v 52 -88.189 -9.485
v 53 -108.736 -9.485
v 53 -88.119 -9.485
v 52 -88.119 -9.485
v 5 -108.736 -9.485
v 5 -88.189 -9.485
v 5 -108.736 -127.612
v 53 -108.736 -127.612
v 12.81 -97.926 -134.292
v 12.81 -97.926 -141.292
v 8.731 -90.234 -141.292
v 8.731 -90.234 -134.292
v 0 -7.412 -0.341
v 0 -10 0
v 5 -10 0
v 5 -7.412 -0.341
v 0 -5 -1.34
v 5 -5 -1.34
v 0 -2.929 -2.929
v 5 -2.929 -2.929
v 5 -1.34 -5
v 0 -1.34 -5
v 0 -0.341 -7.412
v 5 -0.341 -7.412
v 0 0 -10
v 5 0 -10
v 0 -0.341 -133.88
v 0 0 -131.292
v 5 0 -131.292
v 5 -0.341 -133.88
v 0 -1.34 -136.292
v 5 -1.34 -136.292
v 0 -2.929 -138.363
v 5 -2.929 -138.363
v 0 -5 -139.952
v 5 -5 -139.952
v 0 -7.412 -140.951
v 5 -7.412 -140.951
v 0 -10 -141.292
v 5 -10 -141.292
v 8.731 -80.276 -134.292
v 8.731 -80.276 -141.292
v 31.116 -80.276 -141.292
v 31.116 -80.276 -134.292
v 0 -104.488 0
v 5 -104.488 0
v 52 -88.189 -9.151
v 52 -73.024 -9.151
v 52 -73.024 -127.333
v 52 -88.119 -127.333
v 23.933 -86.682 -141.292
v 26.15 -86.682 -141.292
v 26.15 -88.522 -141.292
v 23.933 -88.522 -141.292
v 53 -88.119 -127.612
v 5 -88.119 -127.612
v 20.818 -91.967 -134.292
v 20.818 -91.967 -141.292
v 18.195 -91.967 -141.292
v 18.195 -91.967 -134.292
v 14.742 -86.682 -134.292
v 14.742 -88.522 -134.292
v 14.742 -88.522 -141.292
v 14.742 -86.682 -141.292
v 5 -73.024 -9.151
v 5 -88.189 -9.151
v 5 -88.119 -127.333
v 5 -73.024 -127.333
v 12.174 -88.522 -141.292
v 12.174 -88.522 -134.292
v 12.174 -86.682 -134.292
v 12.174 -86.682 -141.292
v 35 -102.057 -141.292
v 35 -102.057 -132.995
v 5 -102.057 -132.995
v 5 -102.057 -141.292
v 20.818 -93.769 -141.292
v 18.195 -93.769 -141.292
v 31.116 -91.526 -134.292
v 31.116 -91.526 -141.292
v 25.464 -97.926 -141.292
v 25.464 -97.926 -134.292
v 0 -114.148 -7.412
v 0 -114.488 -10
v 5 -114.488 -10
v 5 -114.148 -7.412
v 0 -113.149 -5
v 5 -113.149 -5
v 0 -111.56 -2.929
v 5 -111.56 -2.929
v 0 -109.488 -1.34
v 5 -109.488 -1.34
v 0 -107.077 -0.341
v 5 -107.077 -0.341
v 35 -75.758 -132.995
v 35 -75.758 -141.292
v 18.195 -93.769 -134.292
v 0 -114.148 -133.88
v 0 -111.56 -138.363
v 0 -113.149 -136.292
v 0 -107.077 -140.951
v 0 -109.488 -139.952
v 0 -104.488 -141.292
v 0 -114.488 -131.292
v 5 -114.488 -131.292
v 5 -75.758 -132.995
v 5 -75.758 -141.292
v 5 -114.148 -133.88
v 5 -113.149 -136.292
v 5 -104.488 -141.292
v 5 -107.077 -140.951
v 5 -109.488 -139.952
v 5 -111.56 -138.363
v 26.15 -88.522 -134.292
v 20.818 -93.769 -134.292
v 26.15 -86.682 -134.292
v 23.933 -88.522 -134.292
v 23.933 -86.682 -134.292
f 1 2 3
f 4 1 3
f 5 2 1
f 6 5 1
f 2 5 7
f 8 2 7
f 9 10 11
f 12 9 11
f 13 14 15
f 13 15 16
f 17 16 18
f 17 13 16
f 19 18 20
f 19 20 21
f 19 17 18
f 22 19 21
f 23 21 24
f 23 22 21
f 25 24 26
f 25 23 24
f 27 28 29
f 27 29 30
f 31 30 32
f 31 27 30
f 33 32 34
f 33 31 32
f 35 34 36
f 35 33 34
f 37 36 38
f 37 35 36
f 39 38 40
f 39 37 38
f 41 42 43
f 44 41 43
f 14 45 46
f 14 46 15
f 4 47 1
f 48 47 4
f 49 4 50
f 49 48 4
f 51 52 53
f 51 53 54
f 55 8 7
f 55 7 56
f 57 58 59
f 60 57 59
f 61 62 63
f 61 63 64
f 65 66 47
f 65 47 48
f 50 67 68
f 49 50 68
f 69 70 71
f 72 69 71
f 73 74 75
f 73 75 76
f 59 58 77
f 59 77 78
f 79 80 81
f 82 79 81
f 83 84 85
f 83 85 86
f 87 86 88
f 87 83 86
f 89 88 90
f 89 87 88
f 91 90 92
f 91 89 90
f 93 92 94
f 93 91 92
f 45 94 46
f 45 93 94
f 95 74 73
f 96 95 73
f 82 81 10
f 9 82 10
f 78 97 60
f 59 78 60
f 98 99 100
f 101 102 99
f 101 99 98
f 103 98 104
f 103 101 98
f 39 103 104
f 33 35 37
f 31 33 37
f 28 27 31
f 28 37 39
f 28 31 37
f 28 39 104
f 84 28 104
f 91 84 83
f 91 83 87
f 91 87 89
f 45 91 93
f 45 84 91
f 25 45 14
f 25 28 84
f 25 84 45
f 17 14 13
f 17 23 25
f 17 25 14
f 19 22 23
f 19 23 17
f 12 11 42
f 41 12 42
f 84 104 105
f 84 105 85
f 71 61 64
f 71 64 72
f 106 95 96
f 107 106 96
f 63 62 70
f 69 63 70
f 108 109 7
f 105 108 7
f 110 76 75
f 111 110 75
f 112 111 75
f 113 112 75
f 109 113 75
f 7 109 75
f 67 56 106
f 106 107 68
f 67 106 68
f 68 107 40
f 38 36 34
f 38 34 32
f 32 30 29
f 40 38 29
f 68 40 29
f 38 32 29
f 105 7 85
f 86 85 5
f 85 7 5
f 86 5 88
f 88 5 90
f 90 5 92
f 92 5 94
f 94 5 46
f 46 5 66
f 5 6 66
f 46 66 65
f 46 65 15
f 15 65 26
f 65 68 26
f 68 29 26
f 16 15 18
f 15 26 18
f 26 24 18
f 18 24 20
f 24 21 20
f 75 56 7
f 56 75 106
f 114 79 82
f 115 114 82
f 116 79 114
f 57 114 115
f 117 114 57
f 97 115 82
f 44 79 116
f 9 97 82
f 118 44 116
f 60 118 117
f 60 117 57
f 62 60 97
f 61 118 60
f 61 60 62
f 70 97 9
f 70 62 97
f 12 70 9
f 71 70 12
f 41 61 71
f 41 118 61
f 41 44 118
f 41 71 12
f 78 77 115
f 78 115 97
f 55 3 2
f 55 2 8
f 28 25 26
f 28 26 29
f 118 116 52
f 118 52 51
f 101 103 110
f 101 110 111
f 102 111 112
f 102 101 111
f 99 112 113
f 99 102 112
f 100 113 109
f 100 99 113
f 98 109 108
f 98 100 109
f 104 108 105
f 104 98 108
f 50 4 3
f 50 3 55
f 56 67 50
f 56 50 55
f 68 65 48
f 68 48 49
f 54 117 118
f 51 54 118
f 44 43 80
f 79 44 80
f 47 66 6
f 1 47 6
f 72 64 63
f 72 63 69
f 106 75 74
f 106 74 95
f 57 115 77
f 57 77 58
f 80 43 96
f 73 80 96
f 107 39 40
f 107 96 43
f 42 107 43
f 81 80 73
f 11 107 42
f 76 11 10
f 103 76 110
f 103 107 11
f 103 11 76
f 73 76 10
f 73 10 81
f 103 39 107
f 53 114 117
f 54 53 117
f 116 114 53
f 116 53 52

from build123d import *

# Parameters (mm, degrees)
BOSS_EXTRUDE1_DEPTH = 5
SKETCH2_W           = 118.181462396
SKETCH2_H           = 15.165331065
BOSS_EXTRUDE4_DEPTH = 47
SKETCH3_W           = 118.126380902
SKETCH3_H           = 20.616541225
BOSS_EXTRUDE5_DEPTH = 48
SKETCH4_W           = 8.296758782
SKETCH4_H           = 26.299414598
BOSS_EXTRUDE6_DEPTH = 30
CUT_EXTRUDE3_DEPTH  = 7
SKETCH6_W           = 2.21745904
SKETCH6_H           = 1.840019648
SKETCH6_W_2         = 2.568509623
SKETCH6_W_3         = 2.623522206
SKETCH6_H_2         = 1.802097087
BOSS_EXTRUDE7_DEPTH = 7


with BuildPart() as part:
    # Sketch1 → Boss-Extrude1 (new body)
    with BuildSketch(Plane(origin=(0, 0, 0), x_dir=(0, 0, -1), z_dir=(1, 0, 0))):
        with BuildLine():
            Line((10, 0), (131.29221645, 0))
            ThreePointArc((131.29221645, 0), (138.363284262, -2.928932188), (141.29221645, -10))
            Line((141.29221645, -10), (141.29221645, -104.488481637))
            ThreePointArc((141.29221645, -104.488481637), (138.363284262, -111.559549449), (131.29221645, -114.488481637))
            Line((131.29221645, -114.488481637), (10, -114.488481637))
            ThreePointArc((10, -114.488481637), (2.928932188, -111.559549449), (0, -104.488481637))
            Line((0, -104.488481637), (0, -10))
            ThreePointArc((0, -10), (2.928932188, -2.928932188), (10, 0))
        make_face()
    extrude(amount=BOSS_EXTRUDE1_DEPTH)

    # Sketch2 → Boss-Extrude4 (add)
    with BuildSketch(Plane(origin=(5, 0, 0), x_dir=(0, 0, -1), z_dir=(1, 0, 0))):
        with Locations((68.242208416, -80.606538465)):
            Rectangle(SKETCH2_W, SKETCH2_H)
    extrude(amount=BOSS_EXTRUDE4_DEPTH)

    # Sketch3 → Boss-Extrude5 (add)
    with BuildSketch(Plane(origin=(5, 0, 0), x_dir=(0, 0, -1), z_dir=(1, 0, 0))):
        with Locations((68.5485811, -98.427462894)):
            Rectangle(SKETCH3_W, SKETCH3_H)
    extrude(amount=BOSS_EXTRUDE5_DEPTH)

    # Sketch4 → Boss-Extrude6 (add)
    with BuildSketch(Plane(origin=(5, 0, 0), x_dir=(0, 0, -1), z_dir=(1, 0, 0))):
        with Locations((137.143837059, -88.907539255)):
            Rectangle(SKETCH4_W, SKETCH4_H)
    extrude(amount=BOSS_EXTRUDE6_DEPTH)

    # Sketch5 → Cut-Extrude3 (cut)
    with BuildSketch(Plane(origin=(0, 0, -141.29221645), x_dir=(-1, 0, 0), z_dir=(0, 0, -1))):
        Polygon((-25.464332728, -97.926181685), (-12.810425415, -97.926181685), (-8.73119877, -90.234247578), (-8.73119877, -80.275506322), (-31.116096198, -80.275506322), (-31.116096198, -91.525760494), align=None)
    extrude(amount=-CUT_EXTRUDE3_DEPTH, mode=Mode.SUBTRACT)

    # Sketch6 → Boss-Extrude7 (add)
    with BuildSketch(Plane(origin=(0, 0, -134.29221645), x_dir=(-1, 0, 0), z_dir=(0, 0, -1))):
        with Locations((-25.041507493, -87.601540864)):
            Rectangle(SKETCH6_W, SKETCH6_H)
        with Locations((-13.458219738, -87.601540864)):
            Rectangle(SKETCH6_W_2, SKETCH6_H)
        with Locations((-19.506551217, -92.8677498)):
            Rectangle(SKETCH6_W_3, SKETCH6_H_2)
    extrude(amount=BOSS_EXTRUDE7_DEPTH)


solid = part.part
